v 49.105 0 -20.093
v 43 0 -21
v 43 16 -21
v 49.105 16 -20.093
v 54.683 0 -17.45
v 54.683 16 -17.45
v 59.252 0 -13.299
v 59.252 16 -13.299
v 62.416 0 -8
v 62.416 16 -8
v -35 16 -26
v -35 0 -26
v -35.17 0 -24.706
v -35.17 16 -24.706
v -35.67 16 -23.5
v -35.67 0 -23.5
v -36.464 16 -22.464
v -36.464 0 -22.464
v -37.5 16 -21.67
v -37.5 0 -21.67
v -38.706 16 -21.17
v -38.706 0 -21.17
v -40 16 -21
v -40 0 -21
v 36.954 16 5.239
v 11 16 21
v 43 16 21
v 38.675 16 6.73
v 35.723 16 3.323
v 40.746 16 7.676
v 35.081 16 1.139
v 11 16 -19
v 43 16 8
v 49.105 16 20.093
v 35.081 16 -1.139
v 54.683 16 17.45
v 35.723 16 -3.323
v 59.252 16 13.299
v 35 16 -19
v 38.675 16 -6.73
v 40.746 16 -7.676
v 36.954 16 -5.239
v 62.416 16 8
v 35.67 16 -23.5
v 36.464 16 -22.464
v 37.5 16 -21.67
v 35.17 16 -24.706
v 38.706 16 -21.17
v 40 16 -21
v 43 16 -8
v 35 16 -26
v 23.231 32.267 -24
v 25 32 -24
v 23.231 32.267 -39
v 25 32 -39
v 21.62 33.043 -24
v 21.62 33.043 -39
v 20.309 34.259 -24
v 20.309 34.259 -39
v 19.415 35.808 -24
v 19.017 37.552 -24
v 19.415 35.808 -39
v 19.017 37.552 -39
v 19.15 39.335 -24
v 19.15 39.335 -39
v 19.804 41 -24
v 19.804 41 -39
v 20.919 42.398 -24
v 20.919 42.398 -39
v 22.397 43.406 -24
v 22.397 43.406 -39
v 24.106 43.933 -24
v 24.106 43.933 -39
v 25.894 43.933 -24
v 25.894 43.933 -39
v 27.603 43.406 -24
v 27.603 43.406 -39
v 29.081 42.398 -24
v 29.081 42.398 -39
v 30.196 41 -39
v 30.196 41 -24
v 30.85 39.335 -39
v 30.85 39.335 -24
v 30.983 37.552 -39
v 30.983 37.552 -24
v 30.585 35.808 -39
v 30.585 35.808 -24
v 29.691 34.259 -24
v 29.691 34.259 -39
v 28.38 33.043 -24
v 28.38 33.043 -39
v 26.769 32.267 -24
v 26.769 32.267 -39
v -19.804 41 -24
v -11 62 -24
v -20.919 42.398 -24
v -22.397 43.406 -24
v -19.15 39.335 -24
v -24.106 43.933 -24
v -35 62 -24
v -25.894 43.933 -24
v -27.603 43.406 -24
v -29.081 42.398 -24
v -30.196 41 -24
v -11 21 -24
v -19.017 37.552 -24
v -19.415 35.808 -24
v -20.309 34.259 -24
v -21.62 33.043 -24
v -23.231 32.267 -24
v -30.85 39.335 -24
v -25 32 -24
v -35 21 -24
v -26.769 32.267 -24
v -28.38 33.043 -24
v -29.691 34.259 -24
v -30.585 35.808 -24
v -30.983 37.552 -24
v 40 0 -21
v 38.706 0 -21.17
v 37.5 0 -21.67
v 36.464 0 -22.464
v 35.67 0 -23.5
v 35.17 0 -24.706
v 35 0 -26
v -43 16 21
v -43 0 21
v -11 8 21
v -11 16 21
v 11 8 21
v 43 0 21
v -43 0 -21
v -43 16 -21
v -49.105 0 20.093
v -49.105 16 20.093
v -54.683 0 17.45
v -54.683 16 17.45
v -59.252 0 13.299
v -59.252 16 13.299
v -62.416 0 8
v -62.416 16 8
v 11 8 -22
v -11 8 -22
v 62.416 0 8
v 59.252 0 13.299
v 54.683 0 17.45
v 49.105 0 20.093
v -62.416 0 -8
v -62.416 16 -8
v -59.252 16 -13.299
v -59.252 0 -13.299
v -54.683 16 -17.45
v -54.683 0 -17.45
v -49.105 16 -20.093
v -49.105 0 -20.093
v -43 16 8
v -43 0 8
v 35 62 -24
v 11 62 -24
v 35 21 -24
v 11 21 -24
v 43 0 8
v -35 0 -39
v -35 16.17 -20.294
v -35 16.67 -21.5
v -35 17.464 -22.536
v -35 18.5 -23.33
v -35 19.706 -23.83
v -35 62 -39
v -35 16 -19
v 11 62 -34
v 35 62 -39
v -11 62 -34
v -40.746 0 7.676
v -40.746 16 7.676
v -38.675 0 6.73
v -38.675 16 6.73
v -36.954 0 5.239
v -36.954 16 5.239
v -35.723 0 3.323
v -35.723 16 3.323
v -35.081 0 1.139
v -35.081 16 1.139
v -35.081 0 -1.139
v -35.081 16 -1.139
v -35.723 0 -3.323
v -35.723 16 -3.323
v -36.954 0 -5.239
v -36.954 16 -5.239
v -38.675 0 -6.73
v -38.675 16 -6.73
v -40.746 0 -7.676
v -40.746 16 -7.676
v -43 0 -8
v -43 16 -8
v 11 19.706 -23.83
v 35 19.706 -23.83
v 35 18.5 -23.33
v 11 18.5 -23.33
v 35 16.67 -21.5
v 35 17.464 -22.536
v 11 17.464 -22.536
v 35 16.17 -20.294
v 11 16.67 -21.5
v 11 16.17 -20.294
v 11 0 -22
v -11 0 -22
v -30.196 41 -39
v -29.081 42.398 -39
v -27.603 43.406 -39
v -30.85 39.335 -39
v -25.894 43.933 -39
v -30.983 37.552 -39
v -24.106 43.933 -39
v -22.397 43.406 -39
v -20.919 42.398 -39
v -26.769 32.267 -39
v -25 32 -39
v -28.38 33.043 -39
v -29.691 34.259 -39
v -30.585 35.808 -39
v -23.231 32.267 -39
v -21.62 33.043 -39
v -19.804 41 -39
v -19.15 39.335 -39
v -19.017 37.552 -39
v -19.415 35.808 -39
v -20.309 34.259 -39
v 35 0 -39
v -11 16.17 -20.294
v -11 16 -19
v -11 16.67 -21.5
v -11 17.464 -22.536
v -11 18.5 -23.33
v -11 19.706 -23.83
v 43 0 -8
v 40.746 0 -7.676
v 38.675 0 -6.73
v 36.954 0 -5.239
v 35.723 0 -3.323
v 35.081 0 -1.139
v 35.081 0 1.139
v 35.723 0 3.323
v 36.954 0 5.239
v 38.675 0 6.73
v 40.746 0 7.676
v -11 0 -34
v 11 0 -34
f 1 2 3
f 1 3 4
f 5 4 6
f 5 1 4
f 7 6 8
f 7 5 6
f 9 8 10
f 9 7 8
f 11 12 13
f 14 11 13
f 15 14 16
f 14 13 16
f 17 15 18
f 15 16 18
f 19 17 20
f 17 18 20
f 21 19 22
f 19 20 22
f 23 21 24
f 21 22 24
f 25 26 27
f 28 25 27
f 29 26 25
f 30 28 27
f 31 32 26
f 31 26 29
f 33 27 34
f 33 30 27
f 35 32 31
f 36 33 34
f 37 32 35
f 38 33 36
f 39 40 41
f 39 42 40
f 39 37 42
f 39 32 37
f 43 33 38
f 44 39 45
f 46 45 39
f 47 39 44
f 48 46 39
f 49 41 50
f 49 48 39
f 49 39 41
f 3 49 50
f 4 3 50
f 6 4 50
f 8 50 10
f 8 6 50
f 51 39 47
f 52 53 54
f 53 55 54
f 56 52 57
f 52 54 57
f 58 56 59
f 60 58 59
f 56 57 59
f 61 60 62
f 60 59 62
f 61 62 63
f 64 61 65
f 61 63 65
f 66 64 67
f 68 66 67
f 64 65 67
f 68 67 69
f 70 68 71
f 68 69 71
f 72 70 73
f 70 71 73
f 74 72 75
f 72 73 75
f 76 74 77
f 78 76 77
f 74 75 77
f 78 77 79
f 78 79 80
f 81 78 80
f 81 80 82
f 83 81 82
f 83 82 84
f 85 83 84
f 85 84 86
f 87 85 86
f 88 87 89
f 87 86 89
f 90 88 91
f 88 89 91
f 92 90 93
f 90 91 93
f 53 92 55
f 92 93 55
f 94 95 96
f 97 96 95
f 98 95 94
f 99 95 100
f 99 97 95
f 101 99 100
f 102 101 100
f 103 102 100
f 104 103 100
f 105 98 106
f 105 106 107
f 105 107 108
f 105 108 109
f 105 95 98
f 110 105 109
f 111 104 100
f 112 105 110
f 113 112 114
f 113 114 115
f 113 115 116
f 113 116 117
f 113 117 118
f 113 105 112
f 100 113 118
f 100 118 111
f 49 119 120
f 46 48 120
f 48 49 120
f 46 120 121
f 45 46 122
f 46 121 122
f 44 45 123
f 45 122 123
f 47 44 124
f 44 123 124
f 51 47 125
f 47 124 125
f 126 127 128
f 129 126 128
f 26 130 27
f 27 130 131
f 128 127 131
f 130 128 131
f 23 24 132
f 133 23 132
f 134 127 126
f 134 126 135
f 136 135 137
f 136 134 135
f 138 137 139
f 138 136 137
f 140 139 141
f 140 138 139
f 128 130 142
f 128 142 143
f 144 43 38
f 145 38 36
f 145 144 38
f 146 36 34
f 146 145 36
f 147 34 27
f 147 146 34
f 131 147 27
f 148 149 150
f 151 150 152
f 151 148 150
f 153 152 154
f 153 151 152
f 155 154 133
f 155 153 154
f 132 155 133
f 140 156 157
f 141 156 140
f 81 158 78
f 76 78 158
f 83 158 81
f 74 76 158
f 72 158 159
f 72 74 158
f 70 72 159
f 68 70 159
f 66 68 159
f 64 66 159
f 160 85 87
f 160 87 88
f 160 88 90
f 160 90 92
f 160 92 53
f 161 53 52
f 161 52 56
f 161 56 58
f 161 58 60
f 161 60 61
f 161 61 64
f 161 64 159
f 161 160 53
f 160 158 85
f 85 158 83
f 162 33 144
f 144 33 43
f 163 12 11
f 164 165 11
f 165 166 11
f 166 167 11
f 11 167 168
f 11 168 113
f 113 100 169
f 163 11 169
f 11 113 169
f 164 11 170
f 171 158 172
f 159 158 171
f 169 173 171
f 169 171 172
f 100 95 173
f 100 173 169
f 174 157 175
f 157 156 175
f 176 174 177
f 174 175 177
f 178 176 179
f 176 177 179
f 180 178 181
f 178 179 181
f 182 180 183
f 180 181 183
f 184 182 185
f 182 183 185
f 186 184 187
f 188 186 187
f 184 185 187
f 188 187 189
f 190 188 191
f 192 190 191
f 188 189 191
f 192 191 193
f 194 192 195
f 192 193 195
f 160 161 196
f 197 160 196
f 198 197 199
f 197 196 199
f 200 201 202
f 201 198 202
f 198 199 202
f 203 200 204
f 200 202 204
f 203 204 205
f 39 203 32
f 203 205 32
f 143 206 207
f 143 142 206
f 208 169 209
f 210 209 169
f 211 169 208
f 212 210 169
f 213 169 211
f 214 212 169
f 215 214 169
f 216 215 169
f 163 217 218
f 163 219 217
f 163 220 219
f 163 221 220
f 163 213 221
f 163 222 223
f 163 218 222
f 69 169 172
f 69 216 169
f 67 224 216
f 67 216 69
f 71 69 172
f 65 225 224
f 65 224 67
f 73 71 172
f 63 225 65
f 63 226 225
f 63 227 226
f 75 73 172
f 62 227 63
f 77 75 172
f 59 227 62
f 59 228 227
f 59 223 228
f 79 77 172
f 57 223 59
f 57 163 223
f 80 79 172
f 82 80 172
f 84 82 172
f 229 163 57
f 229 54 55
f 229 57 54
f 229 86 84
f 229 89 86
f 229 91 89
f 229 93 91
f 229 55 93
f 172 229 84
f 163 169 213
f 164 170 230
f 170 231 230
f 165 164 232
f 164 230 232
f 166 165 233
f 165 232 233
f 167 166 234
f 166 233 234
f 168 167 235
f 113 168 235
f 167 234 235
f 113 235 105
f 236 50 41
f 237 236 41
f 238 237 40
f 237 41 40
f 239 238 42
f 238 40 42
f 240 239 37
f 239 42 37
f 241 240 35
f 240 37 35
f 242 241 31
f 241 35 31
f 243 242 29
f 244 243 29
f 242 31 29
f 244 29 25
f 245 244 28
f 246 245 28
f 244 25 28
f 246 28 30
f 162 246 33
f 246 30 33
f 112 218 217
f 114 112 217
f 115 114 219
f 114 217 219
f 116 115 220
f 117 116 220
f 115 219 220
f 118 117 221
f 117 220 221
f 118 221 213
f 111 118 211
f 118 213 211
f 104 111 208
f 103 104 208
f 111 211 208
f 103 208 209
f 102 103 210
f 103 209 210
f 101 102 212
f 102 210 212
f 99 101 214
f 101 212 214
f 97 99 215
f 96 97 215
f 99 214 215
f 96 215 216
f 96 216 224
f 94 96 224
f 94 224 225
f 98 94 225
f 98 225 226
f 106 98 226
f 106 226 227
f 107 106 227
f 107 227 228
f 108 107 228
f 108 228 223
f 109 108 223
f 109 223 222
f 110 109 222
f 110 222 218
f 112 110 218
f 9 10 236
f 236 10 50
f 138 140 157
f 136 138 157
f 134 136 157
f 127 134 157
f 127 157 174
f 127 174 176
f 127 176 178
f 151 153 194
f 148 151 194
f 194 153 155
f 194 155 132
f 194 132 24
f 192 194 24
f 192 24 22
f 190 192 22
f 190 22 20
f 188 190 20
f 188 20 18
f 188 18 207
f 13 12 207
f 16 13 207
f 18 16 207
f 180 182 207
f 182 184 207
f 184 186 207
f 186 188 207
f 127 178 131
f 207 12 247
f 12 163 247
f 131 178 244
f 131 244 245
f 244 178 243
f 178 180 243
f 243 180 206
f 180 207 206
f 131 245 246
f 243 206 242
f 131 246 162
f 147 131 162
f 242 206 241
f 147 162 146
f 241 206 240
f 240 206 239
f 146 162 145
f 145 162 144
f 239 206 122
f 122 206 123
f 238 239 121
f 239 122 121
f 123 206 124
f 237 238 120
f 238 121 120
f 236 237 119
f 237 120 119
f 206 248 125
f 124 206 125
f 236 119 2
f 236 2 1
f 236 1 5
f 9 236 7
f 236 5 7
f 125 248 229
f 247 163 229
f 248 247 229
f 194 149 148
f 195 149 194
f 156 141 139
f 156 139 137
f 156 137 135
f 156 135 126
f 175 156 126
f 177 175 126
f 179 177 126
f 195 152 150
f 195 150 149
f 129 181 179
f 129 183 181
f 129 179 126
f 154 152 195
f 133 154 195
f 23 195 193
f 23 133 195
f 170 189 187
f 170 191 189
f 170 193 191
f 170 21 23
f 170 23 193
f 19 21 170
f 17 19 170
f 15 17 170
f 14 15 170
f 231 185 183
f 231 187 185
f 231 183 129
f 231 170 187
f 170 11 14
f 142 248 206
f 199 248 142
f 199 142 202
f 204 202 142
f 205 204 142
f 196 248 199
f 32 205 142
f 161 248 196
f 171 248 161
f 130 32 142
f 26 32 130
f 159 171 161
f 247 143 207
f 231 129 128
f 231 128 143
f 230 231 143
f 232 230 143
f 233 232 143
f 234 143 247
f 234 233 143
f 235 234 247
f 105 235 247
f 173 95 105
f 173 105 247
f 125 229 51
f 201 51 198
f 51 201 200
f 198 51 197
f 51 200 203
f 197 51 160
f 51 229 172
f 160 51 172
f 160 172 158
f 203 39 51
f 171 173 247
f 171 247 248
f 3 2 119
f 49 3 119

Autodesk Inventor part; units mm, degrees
ref_plane "YZ Plane" through (0, 0, 0) normal (1, 0, 0) x (0, 1, 0)
ref_plane "XZ Plane" through (0, 0, 0) normal (0, 1, 0) x (-1, 0, 0)
ref_plane "XY Plane" through (0, 0, 0) normal (0, 0, 1) x (1, 0, 0)
sketch "Sketch1" plane through (0, 0, 0) normal (0, 1, 0) x (-1, 0, 0)
  line L0 (43, 0) -> (-43, 0) construction
  line L1 (43, 21) -> (-43, 21)
  line L2 (-43, -21) -> (43, -21)
  arc A0 (43, -21) -> (43, 21) centre (43, 0) ccw
  arc A1 (-43, 21) -> (-43, -21) centre (-43, 0) ccw
  point P0 (0, 0)
  dimension "d0" = 43
  dimension "d1" = 21
extrude "Extrusion1" add sketch "Sketch1" along normal blind 16
sketch "Sketch2" plane through (0, 16, 0) normal (0, 1, 0) x (1, 0, 0)
  arc A0 (43, -21) -> (43, 21) centre (43, 0) ccw projected
  arc A1 (-43, 21) -> (-43, -21) centre (-43, 0) ccw projected
  line L0 (-62.4165, 8) -> (-43, 8)
  arc A2 (-43, -8) -> (-43, 8) centre (-43, 0) ccw
  line L1 (-43, -8) -> (-62.4165, -8)
  line L2 (0, 29.4) -> (0, -29.4) construction
  line L3 (62.4165, 8) -> (43, 8)
  arc A3 (43, 8) -> (43, -8) centre (43, 0) ccw
  line L4 (43, -8) -> (62.4165, -8)
  point P0 (0, 0)
  dimension "d4" = 8
extrude "Extrusion2" cut sketch "Sketch2" against normal through all
sketch "Sketch3" plane through (0, 0, 0) normal (0, 1, 0) x (-1, 0, 0)
  line L0 (35, -39) -> (-35, -39)
  line L1 (-35, -39) -> (-35, -24)
  line L2 (-35, -24) -> (35, -24)
  line L3 (35, -24) -> (35, -39)
  line L4 (43, 21) -> (-43, 21) projected
  point P0 (0, 0)
  point P1 (0, -24)
  point P2 (0, 21)
  dimension "d7" = 70
  dimension "d8" = 15
  dimension "d9" = 60
extrude "Extrusion3" add sketch "Sketch3" along normal blind 62
sketch "Sketch4" plane through (0, 16, 0) normal (0, 1, 0) x (1, 0, 0)
  line L0 (43, 21) -> (-43, 21) projected
  line L1 (-35, 24) -> (35, 24) projected
  line L2 (-35, 24) -> (35, 24)
  line L3 (35, 24) -> (35, 21)
  line L4 (35, 21) -> (-35, 21)
  line L5 (-35, 21) -> (-35, 24)
  point P0 (0, 0)
extrude "Extrusion4" add sketch "Sketch4" against normal up to surface (16 mm away)
sketch "Sketch5" plane through (0, 62, 0) normal (0, 1, 0) x (1, 0, 0)
  line L0 (35, 39) -> (-35, 39) projected
  line L1 (-11, 34) -> (11, 34)
  line L2 (11, 34) -> (11, 22)
  line L3 (11, 22) -> (-11, 22)
  line L4 (-11, 22) -> (-11, 34)
  point P0 (0, 0)
  point P1 (0, 22)
  dimension "d14" = 5
  dimension "d15" = 22
  dimension "d16" = 12
extrude "Extrusion5" cut sketch "Sketch5" against normal through all
sketch "Sketch6" plane through (-43, 0, 21) normal (0, 0, 1) x (1, 0, 0)
  line L0 (0, 0) -> (86, 0) projected
  line L1 (0, 16) -> (86, 16) projected
  line L2 (32, 16) -> (54, 16)
  line L3 (54, 16) -> (54, 8)
  line L4 (54, 8) -> (32, 8)
  line L5 (32, 8) -> (32, 16)
  line L6 (32, 16) -> (32, 62) projected
  line L7 (54, 62) -> (54, 16) projected
  point P0 (43, 0)
  dimension "d19" = 8
extrude "Extrusion6" cut sketch "Sketch6" against normal up to surface (55 mm away)
sketch "Sketch7" plane through (-11, 62, -24) normal (1, 0, 0) x (0, 0, -1)
  line L0 (0, -46) -> (0, 0) projected
  line L1 (-45, -46) -> (0, -46) projected
  arc A0 (-5, -46) -> (0, -41) centre (-5, -41) ccw
  point P0 (-24, -62)
  dimension "d22" = 5
extrude "Extrusion7" add sketch "Sketch7" against normal up to surface (24 mm away)
mirror "Mirror1" about plane through (0, 0, 0) normal (1, 0, 0) of "Extrusion7"
fillet "Fillet1" radius 5 2 edges at (35, 8, -21) (-35, 8, -21)
sketch "Sketch8" plane through (-35, 62, -24) normal (0, 0, 1) x (1, 0, 0)
  line L0 (10, -24) -> (60, -24) construction
  line L1 (70, -62) -> (0, -62) projected
  point P0 (35, -62)
  point P1 (35, -24)
  dimension "d26" = 50
  dimension "d27" = 38
hole "Hole1" at (-25, 38, -24) at (25, 38, -24) direction (0, 0, -1) diameter 12 end through all
properties part number "Part022. Corner piece" material "Steel, Cast"
